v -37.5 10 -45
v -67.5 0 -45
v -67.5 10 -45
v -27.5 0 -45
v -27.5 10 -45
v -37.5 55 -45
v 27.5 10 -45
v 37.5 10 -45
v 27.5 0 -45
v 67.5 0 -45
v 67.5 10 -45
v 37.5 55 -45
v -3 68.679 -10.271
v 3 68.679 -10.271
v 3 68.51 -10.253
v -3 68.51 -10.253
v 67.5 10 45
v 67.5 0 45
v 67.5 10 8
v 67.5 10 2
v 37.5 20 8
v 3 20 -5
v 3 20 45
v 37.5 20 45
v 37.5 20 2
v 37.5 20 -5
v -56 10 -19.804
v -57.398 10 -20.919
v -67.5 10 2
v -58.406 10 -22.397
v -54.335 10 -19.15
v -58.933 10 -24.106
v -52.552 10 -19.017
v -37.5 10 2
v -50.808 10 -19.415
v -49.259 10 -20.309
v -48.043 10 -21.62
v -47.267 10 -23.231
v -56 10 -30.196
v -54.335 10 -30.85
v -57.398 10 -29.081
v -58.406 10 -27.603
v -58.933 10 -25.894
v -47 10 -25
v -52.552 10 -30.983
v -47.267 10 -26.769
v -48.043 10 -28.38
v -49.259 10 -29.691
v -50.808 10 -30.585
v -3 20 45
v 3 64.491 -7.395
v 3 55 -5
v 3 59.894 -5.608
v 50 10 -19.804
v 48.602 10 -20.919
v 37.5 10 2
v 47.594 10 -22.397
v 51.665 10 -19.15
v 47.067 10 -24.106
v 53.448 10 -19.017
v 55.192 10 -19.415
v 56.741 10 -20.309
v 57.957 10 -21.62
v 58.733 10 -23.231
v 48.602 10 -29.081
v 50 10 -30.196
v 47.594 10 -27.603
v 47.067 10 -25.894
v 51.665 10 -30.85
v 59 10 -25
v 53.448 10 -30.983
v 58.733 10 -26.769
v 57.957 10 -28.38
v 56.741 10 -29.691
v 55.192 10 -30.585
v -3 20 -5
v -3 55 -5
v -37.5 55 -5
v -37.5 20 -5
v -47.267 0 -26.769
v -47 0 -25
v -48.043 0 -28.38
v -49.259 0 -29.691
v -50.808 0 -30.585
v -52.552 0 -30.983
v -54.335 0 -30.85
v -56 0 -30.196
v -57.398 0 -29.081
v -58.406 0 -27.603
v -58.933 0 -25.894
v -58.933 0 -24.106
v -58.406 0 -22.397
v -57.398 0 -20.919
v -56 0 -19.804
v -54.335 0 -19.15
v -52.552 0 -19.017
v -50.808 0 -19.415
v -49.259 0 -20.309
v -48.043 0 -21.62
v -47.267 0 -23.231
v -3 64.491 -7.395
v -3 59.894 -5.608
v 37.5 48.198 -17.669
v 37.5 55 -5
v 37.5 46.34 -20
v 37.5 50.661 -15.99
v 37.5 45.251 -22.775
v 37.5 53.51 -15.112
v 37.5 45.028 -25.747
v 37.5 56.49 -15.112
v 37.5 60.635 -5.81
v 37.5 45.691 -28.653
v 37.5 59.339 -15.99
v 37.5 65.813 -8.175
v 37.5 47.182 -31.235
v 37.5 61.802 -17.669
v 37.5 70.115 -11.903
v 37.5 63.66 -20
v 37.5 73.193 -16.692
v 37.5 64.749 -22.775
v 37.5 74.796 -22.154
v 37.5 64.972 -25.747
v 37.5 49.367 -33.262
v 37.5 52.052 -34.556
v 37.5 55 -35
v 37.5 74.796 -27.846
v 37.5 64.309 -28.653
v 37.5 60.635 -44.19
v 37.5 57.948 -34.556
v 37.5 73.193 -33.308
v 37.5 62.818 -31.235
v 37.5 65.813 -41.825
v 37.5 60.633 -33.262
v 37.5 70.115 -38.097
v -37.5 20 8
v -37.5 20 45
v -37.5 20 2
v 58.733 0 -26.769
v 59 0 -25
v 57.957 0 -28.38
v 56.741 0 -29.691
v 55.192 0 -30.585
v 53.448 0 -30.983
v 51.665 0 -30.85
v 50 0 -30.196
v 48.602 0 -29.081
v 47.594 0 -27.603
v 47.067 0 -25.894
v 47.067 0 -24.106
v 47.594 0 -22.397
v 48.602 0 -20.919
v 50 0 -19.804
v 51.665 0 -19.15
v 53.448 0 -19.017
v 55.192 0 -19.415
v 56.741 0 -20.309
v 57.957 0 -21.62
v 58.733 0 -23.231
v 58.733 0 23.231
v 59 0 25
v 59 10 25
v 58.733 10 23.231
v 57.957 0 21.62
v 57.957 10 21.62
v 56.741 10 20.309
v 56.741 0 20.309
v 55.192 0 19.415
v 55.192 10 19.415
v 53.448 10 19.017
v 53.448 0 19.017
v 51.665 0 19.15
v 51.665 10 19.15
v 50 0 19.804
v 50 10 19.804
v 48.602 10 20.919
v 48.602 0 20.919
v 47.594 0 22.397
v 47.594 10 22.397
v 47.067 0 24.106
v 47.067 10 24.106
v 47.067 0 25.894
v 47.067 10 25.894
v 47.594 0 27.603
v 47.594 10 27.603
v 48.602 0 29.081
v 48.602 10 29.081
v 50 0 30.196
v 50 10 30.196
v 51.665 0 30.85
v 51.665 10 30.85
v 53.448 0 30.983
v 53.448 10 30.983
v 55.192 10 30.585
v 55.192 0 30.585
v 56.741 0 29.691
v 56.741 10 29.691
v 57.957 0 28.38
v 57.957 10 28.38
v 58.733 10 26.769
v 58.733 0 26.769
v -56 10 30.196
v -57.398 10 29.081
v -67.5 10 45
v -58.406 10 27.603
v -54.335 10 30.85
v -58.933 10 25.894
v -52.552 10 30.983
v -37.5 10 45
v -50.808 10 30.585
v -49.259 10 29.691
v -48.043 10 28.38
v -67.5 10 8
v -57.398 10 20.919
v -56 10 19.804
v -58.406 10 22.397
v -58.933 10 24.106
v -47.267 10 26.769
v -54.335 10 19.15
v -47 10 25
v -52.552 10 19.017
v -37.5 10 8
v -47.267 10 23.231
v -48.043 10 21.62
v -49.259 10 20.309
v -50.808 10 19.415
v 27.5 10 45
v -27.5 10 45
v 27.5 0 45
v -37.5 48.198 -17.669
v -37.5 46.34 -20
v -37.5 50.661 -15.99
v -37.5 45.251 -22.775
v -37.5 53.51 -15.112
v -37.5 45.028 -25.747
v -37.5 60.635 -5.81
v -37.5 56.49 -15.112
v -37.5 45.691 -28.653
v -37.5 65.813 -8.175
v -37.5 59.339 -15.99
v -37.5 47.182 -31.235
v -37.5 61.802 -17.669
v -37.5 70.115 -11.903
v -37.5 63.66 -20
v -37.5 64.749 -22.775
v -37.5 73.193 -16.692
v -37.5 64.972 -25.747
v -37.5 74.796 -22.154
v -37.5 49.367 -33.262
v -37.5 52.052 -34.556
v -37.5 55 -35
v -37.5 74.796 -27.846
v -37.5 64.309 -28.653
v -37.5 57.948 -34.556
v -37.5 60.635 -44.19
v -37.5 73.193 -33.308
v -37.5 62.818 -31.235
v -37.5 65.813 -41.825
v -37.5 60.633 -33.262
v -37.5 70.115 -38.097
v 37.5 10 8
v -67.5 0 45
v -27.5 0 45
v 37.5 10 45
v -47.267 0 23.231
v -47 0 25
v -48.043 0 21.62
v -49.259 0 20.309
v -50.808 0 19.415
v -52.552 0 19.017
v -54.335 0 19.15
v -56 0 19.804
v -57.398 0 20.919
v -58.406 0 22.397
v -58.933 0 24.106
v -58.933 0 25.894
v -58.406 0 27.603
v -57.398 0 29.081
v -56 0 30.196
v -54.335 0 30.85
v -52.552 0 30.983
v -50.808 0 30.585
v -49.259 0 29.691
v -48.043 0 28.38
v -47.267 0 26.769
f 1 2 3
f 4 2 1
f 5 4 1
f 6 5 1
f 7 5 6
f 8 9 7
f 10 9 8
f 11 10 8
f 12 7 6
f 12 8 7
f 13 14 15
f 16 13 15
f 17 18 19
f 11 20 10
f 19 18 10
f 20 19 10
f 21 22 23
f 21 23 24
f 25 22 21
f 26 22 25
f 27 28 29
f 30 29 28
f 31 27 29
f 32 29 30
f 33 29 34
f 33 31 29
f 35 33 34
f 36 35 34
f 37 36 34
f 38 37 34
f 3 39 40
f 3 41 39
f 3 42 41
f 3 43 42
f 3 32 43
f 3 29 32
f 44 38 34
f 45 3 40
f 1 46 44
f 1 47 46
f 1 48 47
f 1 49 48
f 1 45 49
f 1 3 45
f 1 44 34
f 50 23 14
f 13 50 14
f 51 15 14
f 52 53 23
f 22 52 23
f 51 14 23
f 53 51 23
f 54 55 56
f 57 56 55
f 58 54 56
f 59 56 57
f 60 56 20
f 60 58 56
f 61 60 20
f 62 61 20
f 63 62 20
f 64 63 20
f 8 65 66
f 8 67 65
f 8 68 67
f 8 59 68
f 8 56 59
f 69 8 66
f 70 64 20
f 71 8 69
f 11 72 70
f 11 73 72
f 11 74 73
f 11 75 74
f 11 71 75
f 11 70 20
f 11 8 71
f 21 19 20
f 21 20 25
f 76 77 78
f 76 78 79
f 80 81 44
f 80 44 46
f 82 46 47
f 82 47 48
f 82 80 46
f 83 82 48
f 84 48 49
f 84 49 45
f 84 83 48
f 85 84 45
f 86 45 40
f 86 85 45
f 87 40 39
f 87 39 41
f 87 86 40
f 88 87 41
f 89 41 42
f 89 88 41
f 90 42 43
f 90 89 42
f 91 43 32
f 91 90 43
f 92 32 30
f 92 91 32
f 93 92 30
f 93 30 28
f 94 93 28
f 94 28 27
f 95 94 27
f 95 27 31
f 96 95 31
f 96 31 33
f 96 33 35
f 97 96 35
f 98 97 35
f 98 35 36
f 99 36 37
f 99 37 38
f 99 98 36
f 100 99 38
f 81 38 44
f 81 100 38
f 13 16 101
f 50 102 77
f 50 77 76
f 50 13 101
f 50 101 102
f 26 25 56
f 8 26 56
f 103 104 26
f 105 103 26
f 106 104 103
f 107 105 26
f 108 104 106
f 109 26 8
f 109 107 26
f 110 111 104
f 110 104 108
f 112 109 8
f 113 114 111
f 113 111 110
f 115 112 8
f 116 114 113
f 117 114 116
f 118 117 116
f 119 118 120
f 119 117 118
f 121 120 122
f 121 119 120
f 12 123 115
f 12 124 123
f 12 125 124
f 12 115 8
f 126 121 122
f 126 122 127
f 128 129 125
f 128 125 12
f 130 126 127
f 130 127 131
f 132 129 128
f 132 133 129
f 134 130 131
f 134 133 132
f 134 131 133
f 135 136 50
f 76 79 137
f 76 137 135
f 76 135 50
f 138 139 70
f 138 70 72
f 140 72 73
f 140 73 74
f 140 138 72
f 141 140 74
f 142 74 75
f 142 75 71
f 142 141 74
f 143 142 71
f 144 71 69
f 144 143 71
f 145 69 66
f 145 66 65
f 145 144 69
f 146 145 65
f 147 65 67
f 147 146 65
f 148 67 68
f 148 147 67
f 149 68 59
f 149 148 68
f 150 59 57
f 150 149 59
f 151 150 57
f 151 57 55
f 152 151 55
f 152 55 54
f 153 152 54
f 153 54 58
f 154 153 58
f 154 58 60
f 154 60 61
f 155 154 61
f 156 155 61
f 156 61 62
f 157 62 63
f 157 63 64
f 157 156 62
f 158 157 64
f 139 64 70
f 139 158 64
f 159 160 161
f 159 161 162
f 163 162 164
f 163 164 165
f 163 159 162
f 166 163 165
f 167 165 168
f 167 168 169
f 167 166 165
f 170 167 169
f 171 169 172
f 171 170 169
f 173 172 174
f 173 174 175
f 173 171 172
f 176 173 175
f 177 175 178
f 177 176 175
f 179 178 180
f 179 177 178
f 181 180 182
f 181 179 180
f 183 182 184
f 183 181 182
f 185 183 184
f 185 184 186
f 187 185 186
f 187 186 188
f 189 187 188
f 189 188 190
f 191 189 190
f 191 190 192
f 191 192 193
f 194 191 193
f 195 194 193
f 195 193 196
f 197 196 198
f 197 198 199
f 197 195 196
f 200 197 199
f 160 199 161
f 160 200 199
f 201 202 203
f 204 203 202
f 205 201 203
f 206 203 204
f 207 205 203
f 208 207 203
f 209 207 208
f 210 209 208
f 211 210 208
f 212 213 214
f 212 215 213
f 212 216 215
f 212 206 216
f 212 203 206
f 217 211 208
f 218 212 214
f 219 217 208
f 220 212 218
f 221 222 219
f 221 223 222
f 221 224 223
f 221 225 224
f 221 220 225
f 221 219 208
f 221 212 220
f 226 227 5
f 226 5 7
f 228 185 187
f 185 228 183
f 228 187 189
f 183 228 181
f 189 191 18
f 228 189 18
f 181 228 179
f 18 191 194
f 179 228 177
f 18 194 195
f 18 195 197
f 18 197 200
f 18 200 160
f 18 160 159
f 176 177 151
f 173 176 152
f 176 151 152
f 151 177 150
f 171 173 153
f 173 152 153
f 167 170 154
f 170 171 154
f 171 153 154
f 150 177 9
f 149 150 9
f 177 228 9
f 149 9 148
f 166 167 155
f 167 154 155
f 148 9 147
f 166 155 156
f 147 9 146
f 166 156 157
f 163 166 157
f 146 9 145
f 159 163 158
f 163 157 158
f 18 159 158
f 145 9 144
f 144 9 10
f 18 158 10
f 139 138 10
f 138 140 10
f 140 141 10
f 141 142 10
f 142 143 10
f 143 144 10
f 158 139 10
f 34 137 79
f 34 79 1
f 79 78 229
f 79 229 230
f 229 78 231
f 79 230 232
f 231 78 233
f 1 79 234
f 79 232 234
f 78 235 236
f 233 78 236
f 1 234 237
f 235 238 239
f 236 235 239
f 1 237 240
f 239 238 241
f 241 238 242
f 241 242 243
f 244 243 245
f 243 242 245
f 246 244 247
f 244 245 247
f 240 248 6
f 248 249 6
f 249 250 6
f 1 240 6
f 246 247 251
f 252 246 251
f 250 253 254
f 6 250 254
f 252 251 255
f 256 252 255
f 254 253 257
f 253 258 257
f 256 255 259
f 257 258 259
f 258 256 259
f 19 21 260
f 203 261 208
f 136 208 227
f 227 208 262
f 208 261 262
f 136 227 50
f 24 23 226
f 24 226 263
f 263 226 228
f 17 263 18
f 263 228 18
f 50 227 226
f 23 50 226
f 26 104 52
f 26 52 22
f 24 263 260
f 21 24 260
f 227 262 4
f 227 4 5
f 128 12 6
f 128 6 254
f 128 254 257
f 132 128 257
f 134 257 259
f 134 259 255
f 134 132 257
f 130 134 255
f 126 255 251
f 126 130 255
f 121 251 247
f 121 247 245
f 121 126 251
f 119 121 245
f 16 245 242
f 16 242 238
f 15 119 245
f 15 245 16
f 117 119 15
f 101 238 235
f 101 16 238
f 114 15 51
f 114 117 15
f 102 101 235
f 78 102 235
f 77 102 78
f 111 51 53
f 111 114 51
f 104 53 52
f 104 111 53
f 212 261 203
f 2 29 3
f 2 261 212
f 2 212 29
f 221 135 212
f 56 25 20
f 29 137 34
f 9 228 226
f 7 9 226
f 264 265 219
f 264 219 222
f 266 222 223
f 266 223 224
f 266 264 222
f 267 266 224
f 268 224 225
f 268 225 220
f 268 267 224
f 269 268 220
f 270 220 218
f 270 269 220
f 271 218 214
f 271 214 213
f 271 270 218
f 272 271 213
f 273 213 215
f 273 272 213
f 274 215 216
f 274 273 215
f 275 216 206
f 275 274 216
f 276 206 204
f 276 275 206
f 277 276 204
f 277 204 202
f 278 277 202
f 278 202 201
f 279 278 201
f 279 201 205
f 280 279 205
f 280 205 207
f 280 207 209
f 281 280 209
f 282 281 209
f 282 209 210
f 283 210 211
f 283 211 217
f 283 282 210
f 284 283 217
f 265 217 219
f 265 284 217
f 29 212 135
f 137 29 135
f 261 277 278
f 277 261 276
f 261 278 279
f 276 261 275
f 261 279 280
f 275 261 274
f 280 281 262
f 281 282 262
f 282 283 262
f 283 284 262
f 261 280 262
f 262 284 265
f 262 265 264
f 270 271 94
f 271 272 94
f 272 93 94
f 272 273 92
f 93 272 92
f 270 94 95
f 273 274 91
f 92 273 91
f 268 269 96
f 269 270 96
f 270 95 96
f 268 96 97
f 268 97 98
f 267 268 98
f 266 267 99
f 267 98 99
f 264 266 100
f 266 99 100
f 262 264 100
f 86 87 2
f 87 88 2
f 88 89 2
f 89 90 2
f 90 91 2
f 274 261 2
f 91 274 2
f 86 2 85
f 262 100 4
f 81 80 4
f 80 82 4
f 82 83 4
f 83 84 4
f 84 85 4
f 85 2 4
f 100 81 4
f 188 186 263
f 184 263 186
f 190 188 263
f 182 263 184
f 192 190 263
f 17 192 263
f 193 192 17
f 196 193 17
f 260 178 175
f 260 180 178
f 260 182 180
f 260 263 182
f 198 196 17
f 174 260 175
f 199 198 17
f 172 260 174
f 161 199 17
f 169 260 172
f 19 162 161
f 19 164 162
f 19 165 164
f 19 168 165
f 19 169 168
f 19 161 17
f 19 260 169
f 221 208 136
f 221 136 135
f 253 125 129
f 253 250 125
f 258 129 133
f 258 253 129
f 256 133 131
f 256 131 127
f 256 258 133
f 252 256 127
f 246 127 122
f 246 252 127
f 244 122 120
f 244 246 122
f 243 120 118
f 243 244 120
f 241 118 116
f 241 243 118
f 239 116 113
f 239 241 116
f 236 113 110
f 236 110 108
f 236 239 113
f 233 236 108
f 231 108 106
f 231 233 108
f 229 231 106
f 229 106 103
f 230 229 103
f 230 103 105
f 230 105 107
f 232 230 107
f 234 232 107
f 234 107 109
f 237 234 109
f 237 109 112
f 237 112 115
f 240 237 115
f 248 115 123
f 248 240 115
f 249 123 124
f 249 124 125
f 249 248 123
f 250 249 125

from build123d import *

# Parameters (mm, degrees)
CROQUIS2_W              = 135
CROQUIS2_H              = 90
CROQUIS2_R              = 6
SALIENTE_EXTRUIR1_DEPTH = 10
CROQUIS3_W              = 75
CROQUIS3_H              = 90
SALIENTE_EXTRUIR2_DEPTH = 10
CROQUIS4_W              = 55
CROQUIS4_H              = 20
CORTAR_EXTRUIR1_DEPTH   = 91
SALIENTE_EXTRUIR3_DEPTH = 6
CROQUIS11_R             = 10
SALIENTE_EXTRUIR4_DEPTH = 37.5
SALIENTE_EXTRUIR5_DEPTH = 3


with BuildPart() as part:
    # Croquis2 → Saliente-Extruir1 (new body)
    with BuildSketch(Plane(origin=(0, 0, 0), x_dir=(1, 0, 0), z_dir=(0, 1, 0))):
        Rectangle(CROQUIS2_W, CROQUIS2_H)
        with Locations((-53, -25)):
            Circle(CROQUIS2_R, mode=Mode.SUBTRACT)
        with Locations((53, -25)):
            Circle(CROQUIS2_R, mode=Mode.SUBTRACT)
        with Locations((53, 25)):
            Circle(CROQUIS2_R, mode=Mode.SUBTRACT)
        with Locations((-53, 25)):
            Circle(CROQUIS2_R, mode=Mode.SUBTRACT)
    extrude(amount=SALIENTE_EXTRUIR1_DEPTH)

    # Croquis3 → Saliente-Extruir2 (add)
    with BuildSketch(Plane(origin=(0, 10, 0), x_dir=(1, 0, 0), z_dir=(0, 1, 0))):
        Rectangle(CROQUIS3_W, CROQUIS3_H)
    extrude(amount=SALIENTE_EXTRUIR2_DEPTH)

    # Croquis4 → Cortar-Extruir1 (cut, through all)
    with BuildSketch(Plane.XY.offset(45)):
        Rectangle(CROQUIS4_W, CROQUIS4_H)
    extrude(amount=-CORTAR_EXTRUIR1_DEPTH, mode=Mode.SUBTRACT)

    # Croquis9 → Saliente-Extruir3 (add)
    with BuildSketch(Plane.XY.offset(8)):
        Polygon((37.5, 20), (37.5, 10), (67.5, 10), align=None)
    saliente_extruir3 = extrude(amount=-SALIENTE_EXTRUIR3_DEPTH)

    # Simetría1: Saliente-Extruir3 across plane
    add(saliente_extruir3.mirror(Plane(origin=(0, 0, 0), x_dir=(0, 0, 1), z_dir=(1, 0, 0))))

    # Croquis11 → Saliente-Extruir4 (add, symmetric)
    with BuildSketch(Plane(origin=(0, 0, 0), x_dir=(0, 0, -1), z_dir=(1, 0, 0))):
        with BuildLine():
            Line((45, 20), (45, 55))
            ThreePointArc((45, 55), (25, 75), (5, 55))
            Line((5, 55), (5, 20))
            Line((5, 20), (45, 20))
        make_face()
        with Locations((25, 55)):
            Circle(CROQUIS11_R, mode=Mode.SUBTRACT)
    extrude(amount=SALIENTE_EXTRUIR4_DEPTH, both=True)

    # Croquis12 → Saliente-Extruir5 (add, symmetric)
    with BuildSketch(Plane(origin=(0, 0, 0), x_dir=(0, 0, -1), z_dir=(1, 0, 0))):
        Polygon((-45, 20), (10.271335942, 68.678995905), (5, 20), align=None)
    extrude(amount=SALIENTE_EXTRUIR5_DEPTH, both=True)


solid = part.part
